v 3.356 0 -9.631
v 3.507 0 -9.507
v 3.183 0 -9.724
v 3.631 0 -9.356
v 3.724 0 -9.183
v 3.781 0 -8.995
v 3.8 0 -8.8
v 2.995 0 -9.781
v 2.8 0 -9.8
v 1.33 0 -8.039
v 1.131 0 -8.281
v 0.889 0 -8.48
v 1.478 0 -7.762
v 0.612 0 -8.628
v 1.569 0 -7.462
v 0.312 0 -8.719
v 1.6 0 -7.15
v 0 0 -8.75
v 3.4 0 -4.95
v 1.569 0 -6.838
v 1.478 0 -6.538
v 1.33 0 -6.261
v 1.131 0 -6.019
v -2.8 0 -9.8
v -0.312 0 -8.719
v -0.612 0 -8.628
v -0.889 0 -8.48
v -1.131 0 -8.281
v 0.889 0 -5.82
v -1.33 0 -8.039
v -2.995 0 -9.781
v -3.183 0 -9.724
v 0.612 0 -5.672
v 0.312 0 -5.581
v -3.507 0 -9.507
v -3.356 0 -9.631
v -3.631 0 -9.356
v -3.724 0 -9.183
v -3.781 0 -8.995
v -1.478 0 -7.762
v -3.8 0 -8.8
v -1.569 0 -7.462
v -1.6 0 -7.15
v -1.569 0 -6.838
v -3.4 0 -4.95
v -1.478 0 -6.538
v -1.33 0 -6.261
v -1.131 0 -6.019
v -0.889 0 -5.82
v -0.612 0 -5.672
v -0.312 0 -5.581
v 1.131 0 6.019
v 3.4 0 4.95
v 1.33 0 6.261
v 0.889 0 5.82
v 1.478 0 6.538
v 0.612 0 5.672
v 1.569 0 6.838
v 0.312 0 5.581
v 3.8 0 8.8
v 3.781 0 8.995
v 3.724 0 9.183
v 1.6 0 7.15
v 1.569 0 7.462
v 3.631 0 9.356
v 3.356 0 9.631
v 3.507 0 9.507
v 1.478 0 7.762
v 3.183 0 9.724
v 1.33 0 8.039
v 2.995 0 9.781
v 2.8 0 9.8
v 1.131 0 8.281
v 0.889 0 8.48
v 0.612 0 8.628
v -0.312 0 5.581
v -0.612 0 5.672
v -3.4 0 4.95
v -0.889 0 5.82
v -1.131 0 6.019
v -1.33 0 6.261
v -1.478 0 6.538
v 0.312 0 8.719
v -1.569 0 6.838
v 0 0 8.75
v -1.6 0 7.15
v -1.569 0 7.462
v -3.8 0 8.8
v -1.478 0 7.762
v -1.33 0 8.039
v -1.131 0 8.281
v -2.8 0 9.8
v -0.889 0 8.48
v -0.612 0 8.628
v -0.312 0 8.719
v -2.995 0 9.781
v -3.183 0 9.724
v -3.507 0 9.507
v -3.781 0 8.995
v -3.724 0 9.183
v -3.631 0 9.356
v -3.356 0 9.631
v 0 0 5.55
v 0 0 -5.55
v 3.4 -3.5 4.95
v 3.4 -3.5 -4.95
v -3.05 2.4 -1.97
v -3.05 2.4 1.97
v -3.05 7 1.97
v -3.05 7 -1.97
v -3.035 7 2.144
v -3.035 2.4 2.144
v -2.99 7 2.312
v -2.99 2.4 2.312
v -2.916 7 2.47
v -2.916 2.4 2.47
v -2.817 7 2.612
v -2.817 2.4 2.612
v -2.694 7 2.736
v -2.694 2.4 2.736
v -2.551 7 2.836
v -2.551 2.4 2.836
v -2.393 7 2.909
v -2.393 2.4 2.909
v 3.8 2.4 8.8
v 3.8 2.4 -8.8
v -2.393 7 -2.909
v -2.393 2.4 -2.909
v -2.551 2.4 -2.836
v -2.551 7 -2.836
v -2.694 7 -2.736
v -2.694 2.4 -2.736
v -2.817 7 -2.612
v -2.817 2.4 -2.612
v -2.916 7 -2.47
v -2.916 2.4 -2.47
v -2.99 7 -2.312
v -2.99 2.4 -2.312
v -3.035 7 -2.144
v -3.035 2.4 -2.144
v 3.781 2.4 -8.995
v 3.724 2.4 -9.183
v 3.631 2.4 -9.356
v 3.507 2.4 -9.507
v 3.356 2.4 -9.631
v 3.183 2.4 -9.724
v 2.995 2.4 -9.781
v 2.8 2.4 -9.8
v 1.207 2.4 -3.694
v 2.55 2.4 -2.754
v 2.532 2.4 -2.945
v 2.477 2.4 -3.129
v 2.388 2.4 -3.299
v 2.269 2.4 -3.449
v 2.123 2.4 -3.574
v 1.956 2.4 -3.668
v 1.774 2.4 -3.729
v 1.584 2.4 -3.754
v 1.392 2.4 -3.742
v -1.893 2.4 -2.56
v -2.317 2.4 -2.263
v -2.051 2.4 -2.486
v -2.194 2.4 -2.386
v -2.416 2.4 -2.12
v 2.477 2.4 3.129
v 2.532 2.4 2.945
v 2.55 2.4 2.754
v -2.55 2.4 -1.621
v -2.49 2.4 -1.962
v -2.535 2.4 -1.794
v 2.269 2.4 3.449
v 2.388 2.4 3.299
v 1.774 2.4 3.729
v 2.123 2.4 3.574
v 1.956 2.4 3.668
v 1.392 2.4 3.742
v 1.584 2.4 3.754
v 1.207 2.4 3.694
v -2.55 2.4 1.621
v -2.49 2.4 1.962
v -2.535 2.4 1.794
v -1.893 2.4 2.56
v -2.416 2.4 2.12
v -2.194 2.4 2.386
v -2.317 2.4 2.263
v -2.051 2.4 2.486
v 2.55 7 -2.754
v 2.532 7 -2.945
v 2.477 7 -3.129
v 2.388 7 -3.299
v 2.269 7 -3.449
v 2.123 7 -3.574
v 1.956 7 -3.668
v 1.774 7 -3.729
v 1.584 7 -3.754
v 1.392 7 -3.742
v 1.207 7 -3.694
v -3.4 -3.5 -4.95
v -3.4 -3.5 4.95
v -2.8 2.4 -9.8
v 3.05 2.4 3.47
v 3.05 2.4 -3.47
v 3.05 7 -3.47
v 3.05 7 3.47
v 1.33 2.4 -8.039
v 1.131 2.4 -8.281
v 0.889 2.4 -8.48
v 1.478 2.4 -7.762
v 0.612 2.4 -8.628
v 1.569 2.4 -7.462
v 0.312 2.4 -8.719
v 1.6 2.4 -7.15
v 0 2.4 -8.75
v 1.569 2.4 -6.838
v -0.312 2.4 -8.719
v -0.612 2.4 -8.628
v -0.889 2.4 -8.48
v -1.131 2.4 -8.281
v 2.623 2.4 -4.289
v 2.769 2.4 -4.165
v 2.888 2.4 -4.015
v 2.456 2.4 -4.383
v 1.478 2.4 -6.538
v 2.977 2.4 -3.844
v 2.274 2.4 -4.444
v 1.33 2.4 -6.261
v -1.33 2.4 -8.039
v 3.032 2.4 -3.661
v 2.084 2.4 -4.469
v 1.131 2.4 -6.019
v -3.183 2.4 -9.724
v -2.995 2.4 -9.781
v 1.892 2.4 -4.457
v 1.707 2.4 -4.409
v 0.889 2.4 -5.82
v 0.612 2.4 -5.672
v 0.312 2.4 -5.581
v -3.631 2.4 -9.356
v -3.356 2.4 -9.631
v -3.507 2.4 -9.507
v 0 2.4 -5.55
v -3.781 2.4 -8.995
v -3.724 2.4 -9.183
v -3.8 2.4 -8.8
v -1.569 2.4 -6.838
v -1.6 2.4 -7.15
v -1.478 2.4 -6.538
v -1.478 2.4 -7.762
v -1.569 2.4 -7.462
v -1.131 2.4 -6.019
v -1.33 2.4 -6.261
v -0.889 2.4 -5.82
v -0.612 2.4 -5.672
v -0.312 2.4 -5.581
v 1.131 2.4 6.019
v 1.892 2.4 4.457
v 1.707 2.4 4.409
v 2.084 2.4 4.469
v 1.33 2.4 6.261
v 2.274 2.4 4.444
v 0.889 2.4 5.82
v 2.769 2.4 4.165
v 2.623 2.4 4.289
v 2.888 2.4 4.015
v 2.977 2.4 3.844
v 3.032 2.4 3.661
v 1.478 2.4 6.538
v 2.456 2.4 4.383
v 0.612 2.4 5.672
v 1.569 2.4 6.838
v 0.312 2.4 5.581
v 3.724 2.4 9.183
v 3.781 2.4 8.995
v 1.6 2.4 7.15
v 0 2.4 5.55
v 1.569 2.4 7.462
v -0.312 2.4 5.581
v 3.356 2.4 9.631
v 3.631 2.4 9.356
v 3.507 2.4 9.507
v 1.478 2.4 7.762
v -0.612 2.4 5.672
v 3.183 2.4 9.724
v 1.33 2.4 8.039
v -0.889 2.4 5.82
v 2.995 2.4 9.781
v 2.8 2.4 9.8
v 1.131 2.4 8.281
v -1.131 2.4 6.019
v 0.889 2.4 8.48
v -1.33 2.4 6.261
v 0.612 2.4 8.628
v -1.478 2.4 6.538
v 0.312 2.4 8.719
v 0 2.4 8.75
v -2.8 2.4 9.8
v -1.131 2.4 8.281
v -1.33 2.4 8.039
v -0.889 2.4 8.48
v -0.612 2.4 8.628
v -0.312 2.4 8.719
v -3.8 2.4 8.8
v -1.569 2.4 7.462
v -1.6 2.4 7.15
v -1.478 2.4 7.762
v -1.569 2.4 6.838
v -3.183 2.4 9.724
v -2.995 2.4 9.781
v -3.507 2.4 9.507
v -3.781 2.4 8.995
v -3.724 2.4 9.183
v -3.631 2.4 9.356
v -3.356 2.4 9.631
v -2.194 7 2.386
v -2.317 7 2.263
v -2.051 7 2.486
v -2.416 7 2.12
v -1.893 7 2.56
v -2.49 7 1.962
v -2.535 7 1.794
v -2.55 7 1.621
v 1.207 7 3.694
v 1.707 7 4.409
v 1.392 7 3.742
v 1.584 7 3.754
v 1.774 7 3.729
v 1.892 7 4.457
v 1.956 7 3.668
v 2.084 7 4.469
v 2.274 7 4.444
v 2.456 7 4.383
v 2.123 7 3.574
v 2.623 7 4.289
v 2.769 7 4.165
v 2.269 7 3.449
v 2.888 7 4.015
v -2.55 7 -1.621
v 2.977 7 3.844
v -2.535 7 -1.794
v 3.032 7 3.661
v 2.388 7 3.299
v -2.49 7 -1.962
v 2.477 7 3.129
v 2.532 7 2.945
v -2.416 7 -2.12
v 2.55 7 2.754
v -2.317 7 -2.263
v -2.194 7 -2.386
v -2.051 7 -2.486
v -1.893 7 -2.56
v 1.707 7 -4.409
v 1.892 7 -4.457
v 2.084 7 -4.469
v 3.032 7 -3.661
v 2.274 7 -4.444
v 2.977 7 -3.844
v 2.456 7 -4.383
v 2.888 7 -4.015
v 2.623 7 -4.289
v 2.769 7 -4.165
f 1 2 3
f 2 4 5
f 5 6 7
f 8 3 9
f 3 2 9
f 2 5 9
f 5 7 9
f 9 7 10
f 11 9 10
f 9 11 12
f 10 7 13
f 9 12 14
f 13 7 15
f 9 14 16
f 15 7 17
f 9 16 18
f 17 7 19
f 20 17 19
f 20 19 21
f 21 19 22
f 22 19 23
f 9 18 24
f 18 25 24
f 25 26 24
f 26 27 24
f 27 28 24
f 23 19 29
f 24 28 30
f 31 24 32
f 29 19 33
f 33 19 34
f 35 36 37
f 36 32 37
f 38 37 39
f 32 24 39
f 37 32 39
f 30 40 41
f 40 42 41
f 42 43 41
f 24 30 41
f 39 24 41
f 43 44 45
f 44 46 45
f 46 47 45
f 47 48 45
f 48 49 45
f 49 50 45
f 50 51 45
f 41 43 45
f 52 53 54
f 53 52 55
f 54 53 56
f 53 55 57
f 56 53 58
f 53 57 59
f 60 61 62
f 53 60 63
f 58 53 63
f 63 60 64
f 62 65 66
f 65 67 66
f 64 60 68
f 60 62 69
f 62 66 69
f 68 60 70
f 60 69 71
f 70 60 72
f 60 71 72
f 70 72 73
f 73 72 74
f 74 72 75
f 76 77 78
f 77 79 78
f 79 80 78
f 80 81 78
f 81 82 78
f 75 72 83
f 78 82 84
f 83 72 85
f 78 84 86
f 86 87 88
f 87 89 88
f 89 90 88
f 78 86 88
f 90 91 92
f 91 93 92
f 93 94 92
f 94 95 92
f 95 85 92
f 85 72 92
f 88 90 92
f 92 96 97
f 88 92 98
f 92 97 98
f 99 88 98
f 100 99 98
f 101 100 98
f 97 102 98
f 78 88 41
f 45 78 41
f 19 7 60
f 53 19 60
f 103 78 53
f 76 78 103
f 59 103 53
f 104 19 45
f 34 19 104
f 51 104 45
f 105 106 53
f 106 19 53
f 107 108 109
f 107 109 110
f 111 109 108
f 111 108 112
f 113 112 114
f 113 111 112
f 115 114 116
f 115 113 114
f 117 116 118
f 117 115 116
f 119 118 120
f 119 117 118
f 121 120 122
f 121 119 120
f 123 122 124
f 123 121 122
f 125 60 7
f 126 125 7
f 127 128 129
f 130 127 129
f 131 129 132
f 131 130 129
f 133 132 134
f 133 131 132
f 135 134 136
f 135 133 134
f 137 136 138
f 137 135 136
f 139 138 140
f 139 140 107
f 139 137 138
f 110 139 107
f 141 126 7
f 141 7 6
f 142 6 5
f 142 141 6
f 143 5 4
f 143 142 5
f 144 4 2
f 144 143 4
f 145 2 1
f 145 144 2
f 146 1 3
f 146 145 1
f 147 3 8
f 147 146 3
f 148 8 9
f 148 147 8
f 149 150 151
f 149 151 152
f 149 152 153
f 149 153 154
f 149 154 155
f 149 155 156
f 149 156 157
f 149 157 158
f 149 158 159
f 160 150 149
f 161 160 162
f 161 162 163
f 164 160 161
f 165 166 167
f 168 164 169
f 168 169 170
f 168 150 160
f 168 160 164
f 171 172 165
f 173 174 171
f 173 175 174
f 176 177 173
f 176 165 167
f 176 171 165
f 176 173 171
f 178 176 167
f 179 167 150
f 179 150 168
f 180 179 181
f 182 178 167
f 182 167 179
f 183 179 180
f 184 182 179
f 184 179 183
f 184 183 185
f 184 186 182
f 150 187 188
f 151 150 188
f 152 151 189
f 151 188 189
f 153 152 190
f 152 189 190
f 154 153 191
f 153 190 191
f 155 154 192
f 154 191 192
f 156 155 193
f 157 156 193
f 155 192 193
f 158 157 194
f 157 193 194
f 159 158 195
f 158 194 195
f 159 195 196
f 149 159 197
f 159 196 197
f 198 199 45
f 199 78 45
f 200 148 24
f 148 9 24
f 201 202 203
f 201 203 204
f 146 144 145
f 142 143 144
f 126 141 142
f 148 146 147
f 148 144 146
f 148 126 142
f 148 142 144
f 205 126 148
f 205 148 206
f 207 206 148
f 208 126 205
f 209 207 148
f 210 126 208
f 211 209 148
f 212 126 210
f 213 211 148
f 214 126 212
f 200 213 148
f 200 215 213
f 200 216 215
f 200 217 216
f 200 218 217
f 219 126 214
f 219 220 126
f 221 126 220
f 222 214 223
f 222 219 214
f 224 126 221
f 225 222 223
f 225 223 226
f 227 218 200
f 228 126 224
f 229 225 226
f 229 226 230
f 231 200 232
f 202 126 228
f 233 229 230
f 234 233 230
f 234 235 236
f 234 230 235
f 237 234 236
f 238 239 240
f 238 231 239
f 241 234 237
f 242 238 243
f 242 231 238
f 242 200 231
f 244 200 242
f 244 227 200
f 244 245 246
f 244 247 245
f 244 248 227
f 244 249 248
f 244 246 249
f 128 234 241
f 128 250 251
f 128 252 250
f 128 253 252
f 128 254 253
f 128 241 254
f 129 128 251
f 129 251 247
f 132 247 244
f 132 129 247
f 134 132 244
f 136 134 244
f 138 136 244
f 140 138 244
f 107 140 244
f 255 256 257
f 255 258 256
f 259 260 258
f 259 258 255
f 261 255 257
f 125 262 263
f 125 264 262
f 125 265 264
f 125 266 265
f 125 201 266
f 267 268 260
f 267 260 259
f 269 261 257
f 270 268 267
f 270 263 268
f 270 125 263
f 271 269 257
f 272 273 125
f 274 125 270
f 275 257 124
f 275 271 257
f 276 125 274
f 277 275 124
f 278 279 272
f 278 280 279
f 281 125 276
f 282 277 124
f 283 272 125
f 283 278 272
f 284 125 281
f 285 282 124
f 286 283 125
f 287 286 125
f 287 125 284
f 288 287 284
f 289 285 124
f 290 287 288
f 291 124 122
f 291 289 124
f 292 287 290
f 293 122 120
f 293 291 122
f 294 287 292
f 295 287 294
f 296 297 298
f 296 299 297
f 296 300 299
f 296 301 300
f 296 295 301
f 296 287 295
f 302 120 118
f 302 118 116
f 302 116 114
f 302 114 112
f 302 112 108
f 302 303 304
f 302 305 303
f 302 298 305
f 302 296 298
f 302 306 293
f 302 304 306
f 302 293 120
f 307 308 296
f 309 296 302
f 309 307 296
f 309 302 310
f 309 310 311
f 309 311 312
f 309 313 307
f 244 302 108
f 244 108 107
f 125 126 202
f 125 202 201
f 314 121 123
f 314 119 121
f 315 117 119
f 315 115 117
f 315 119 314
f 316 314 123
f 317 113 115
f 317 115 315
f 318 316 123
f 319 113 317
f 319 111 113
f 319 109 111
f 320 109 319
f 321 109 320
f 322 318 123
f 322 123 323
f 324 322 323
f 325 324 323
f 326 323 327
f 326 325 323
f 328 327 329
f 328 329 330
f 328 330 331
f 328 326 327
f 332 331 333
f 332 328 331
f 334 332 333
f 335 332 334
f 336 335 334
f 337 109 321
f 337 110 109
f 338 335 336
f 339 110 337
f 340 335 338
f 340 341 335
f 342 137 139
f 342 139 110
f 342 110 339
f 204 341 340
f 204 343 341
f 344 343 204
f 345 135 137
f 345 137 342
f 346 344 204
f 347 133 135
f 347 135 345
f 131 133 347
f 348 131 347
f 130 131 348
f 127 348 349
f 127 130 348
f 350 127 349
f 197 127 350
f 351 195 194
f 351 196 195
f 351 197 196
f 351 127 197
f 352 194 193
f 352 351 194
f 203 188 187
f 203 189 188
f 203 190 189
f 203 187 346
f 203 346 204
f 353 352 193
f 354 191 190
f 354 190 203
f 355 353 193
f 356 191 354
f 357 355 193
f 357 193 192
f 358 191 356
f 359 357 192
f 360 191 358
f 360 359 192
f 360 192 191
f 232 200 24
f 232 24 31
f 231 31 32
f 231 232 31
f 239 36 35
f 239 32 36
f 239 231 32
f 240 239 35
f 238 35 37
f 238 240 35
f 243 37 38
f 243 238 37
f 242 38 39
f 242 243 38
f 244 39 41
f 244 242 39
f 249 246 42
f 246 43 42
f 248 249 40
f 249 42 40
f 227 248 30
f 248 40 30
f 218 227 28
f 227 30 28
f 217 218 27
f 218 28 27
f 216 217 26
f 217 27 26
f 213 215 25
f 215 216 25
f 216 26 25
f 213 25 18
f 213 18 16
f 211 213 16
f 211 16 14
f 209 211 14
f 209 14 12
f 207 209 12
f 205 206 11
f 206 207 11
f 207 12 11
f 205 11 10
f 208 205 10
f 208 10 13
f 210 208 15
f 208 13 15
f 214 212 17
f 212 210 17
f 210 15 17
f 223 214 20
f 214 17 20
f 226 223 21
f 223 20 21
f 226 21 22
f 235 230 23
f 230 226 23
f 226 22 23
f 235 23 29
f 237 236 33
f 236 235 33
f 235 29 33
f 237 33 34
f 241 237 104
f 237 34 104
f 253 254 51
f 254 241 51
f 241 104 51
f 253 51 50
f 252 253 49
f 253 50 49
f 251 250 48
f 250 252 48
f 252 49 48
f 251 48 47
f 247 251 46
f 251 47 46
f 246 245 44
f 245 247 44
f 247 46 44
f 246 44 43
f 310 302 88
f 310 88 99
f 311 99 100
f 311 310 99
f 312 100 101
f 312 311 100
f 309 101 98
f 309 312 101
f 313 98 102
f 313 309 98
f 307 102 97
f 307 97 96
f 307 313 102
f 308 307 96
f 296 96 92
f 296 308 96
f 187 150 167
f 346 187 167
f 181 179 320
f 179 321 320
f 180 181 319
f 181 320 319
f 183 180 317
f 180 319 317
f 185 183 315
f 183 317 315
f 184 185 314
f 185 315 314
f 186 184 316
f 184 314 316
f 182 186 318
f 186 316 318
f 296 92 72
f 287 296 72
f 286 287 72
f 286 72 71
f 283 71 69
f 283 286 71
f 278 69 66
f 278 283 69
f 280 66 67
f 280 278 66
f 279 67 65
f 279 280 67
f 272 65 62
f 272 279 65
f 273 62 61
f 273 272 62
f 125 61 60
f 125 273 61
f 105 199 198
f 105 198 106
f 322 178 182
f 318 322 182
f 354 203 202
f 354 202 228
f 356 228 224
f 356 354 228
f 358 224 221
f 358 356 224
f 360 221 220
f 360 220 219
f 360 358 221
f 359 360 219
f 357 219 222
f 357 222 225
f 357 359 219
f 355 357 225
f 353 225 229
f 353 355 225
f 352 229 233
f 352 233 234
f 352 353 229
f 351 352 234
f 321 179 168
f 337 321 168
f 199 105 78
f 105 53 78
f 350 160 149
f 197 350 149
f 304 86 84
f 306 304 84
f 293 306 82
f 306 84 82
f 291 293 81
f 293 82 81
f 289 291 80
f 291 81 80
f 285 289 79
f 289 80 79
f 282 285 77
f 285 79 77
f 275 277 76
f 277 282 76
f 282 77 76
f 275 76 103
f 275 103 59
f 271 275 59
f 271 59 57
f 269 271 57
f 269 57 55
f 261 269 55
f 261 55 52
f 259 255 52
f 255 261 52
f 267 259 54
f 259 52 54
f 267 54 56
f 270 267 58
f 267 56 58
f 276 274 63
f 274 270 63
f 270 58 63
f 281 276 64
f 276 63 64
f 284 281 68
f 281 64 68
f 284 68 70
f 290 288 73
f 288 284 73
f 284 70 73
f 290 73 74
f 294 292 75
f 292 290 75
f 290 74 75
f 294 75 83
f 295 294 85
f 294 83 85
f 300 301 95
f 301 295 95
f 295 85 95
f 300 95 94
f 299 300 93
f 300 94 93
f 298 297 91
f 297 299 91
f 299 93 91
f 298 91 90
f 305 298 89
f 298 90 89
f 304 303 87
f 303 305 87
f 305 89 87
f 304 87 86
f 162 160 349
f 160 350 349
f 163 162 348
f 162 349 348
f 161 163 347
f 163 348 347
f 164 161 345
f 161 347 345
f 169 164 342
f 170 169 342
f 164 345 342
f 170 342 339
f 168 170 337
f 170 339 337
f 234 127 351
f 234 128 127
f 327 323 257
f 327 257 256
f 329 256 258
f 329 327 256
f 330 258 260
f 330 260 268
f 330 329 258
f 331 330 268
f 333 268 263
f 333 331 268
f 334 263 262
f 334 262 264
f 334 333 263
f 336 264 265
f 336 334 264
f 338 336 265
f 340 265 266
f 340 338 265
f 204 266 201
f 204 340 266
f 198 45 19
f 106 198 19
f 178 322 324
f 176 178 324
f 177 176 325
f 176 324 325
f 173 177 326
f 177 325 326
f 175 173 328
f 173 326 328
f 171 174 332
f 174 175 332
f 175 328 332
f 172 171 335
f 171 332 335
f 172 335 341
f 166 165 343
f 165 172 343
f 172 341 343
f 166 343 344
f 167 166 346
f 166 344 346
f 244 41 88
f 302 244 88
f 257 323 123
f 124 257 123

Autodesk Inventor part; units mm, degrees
ref_plane "YZ Plane" through (0, 0, 0) normal (1, 0, 0) x (0, 1, 0)
ref_plane "XZ Plane" through (0, 0, 0) normal (0, 1, 0) x (-1, 0, 0)
ref_plane "XY Plane" through (0, 0, 0) normal (0, 0, 1) x (1, 0, 0)
sketch "Sketch1" plane through (0, 0, 0) normal (0, 1, 0) x (-1, 0, 0)
  line L0 (3.8, 9.8) -> (-3.8, 9.8)
  line L1 (-3.8, 9.8) -> (-3.8, -9.8)
  line L2 (-3.8, -9.8) -> (3.8, -9.8)
  line L3 (3.8, -9.8) -> (3.8, 9.8)
  circle A0 centre (0, 7.15) radius 1.6
  circle A1 centre (0, -7.15) radius 1.6
  point P0 (0, 0)
  dimension "d0" = 19.6
  dimension "d1" = 7.6
  dimension "d2" = 9.8
  dimension "d3" = 3.8
  dimension "d4" = 3.2
  dimension "d5" = 3.2
  dimension "d6" = 14.3
  dimension "d7" = 7.15
extrude "Extrusion1" add sketch "Sketch1" along normal blind 2.4
fillet "Fillet1" radius 1 4 edges at (3.8, 1.2, 9.8) (-3.8, 1.2, 9.8) (3.8, 1.2, -9.8) (-3.8, 1.2, -9.8)
sketch "Sketch2" plane through (0, 2.4, 0) normal (0, 1, 0) x (1, 0, 0)
  line L0 (-3.05, -2.6694) -> (-3.05, 2.6694)
  line L1 (-3.05, 2.6694) -> (3.05, 4.9)
  line L2 (3.05, 4.9) -> (3.05, -4.9)
  line L3 (3.05, -4.9) -> (-3.05, -2.6694)
  line L4 (2.55, -4.1848) -> (-2.55, -2.3198)
  line L5 (-2.55, -2.3198) -> (-2.55, 2.3198)
  line L6 (-2.55, 2.3198) -> (2.55, 4.1848)
  line L7 (2.55, 4.1848) -> (2.55, -4.1848)
  point P0 (0, 0)
  dimension "d11" = 69.914
  dimension "d13" = 9.8
  dimension "d14" = 6.1
  dimension "d15" = 3.05
  dimension "d17" = 0.5
  dimension "d18" = 0.5
  dimension "d19" = 0.5
  dimension "d20" = 0.5
  dimension "d21" = 4.9
  dimension "d22" = 69.914
  dimension "d23" = 69.914
extrude "Extrusion2" add sketch "Sketch2" along normal blind 4.6
fillet "Fillet2" radius 1 8 edges at (-3.05, 4.7, -2.6694) (-3.05, 4.7, 2.6694) (3.05, 4.7, 4.9) (3.05, 4.7, -4.9) (-2.55, 4.7, -2.3198) (-2.55, 4.7, 2.3198) (2.55, 4.7, -4.1848) (2.55, 4.7, 4.1848)
sketch "Sketch3" plane through (0, 0, 0) normal (0, -1, 0) x (1, 0, 0)
  line L0 (3.4, 4.95) -> (-3.4, 4.95)
  line L1 (-3.4, 4.95) -> (-3.4, -4.95)
  line L2 (-3.4, -4.95) -> (3.4, -4.95)
  line L3 (3.4, -4.95) -> (3.4, 4.95)
  point P0 (0, 0)
  dimension "d27" = 9.9
  dimension "d28" = 6.8
  dimension "d29" = 4.95
  dimension "d30" = 3.4
extrude "Extrusion3" add sketch "Sketch3" along normal blind 3.5
equation "\"d2\" = 0.5 * d0"
equation "\"d3\" = 0.5 * d1"
equation "\"d5\" = d4"
equation "\"d7\" = 0.5 * d6"
equation "\"d15\" = 0.5 * d14"
equation "\"d21\" = 0.5 * d13"
equation "\"d22\" = d11"
equation "\"d29\" = 0.5 * d27"
equation "\"d30\" = 0.5 * d28"
properties part number "9pin female connector"
